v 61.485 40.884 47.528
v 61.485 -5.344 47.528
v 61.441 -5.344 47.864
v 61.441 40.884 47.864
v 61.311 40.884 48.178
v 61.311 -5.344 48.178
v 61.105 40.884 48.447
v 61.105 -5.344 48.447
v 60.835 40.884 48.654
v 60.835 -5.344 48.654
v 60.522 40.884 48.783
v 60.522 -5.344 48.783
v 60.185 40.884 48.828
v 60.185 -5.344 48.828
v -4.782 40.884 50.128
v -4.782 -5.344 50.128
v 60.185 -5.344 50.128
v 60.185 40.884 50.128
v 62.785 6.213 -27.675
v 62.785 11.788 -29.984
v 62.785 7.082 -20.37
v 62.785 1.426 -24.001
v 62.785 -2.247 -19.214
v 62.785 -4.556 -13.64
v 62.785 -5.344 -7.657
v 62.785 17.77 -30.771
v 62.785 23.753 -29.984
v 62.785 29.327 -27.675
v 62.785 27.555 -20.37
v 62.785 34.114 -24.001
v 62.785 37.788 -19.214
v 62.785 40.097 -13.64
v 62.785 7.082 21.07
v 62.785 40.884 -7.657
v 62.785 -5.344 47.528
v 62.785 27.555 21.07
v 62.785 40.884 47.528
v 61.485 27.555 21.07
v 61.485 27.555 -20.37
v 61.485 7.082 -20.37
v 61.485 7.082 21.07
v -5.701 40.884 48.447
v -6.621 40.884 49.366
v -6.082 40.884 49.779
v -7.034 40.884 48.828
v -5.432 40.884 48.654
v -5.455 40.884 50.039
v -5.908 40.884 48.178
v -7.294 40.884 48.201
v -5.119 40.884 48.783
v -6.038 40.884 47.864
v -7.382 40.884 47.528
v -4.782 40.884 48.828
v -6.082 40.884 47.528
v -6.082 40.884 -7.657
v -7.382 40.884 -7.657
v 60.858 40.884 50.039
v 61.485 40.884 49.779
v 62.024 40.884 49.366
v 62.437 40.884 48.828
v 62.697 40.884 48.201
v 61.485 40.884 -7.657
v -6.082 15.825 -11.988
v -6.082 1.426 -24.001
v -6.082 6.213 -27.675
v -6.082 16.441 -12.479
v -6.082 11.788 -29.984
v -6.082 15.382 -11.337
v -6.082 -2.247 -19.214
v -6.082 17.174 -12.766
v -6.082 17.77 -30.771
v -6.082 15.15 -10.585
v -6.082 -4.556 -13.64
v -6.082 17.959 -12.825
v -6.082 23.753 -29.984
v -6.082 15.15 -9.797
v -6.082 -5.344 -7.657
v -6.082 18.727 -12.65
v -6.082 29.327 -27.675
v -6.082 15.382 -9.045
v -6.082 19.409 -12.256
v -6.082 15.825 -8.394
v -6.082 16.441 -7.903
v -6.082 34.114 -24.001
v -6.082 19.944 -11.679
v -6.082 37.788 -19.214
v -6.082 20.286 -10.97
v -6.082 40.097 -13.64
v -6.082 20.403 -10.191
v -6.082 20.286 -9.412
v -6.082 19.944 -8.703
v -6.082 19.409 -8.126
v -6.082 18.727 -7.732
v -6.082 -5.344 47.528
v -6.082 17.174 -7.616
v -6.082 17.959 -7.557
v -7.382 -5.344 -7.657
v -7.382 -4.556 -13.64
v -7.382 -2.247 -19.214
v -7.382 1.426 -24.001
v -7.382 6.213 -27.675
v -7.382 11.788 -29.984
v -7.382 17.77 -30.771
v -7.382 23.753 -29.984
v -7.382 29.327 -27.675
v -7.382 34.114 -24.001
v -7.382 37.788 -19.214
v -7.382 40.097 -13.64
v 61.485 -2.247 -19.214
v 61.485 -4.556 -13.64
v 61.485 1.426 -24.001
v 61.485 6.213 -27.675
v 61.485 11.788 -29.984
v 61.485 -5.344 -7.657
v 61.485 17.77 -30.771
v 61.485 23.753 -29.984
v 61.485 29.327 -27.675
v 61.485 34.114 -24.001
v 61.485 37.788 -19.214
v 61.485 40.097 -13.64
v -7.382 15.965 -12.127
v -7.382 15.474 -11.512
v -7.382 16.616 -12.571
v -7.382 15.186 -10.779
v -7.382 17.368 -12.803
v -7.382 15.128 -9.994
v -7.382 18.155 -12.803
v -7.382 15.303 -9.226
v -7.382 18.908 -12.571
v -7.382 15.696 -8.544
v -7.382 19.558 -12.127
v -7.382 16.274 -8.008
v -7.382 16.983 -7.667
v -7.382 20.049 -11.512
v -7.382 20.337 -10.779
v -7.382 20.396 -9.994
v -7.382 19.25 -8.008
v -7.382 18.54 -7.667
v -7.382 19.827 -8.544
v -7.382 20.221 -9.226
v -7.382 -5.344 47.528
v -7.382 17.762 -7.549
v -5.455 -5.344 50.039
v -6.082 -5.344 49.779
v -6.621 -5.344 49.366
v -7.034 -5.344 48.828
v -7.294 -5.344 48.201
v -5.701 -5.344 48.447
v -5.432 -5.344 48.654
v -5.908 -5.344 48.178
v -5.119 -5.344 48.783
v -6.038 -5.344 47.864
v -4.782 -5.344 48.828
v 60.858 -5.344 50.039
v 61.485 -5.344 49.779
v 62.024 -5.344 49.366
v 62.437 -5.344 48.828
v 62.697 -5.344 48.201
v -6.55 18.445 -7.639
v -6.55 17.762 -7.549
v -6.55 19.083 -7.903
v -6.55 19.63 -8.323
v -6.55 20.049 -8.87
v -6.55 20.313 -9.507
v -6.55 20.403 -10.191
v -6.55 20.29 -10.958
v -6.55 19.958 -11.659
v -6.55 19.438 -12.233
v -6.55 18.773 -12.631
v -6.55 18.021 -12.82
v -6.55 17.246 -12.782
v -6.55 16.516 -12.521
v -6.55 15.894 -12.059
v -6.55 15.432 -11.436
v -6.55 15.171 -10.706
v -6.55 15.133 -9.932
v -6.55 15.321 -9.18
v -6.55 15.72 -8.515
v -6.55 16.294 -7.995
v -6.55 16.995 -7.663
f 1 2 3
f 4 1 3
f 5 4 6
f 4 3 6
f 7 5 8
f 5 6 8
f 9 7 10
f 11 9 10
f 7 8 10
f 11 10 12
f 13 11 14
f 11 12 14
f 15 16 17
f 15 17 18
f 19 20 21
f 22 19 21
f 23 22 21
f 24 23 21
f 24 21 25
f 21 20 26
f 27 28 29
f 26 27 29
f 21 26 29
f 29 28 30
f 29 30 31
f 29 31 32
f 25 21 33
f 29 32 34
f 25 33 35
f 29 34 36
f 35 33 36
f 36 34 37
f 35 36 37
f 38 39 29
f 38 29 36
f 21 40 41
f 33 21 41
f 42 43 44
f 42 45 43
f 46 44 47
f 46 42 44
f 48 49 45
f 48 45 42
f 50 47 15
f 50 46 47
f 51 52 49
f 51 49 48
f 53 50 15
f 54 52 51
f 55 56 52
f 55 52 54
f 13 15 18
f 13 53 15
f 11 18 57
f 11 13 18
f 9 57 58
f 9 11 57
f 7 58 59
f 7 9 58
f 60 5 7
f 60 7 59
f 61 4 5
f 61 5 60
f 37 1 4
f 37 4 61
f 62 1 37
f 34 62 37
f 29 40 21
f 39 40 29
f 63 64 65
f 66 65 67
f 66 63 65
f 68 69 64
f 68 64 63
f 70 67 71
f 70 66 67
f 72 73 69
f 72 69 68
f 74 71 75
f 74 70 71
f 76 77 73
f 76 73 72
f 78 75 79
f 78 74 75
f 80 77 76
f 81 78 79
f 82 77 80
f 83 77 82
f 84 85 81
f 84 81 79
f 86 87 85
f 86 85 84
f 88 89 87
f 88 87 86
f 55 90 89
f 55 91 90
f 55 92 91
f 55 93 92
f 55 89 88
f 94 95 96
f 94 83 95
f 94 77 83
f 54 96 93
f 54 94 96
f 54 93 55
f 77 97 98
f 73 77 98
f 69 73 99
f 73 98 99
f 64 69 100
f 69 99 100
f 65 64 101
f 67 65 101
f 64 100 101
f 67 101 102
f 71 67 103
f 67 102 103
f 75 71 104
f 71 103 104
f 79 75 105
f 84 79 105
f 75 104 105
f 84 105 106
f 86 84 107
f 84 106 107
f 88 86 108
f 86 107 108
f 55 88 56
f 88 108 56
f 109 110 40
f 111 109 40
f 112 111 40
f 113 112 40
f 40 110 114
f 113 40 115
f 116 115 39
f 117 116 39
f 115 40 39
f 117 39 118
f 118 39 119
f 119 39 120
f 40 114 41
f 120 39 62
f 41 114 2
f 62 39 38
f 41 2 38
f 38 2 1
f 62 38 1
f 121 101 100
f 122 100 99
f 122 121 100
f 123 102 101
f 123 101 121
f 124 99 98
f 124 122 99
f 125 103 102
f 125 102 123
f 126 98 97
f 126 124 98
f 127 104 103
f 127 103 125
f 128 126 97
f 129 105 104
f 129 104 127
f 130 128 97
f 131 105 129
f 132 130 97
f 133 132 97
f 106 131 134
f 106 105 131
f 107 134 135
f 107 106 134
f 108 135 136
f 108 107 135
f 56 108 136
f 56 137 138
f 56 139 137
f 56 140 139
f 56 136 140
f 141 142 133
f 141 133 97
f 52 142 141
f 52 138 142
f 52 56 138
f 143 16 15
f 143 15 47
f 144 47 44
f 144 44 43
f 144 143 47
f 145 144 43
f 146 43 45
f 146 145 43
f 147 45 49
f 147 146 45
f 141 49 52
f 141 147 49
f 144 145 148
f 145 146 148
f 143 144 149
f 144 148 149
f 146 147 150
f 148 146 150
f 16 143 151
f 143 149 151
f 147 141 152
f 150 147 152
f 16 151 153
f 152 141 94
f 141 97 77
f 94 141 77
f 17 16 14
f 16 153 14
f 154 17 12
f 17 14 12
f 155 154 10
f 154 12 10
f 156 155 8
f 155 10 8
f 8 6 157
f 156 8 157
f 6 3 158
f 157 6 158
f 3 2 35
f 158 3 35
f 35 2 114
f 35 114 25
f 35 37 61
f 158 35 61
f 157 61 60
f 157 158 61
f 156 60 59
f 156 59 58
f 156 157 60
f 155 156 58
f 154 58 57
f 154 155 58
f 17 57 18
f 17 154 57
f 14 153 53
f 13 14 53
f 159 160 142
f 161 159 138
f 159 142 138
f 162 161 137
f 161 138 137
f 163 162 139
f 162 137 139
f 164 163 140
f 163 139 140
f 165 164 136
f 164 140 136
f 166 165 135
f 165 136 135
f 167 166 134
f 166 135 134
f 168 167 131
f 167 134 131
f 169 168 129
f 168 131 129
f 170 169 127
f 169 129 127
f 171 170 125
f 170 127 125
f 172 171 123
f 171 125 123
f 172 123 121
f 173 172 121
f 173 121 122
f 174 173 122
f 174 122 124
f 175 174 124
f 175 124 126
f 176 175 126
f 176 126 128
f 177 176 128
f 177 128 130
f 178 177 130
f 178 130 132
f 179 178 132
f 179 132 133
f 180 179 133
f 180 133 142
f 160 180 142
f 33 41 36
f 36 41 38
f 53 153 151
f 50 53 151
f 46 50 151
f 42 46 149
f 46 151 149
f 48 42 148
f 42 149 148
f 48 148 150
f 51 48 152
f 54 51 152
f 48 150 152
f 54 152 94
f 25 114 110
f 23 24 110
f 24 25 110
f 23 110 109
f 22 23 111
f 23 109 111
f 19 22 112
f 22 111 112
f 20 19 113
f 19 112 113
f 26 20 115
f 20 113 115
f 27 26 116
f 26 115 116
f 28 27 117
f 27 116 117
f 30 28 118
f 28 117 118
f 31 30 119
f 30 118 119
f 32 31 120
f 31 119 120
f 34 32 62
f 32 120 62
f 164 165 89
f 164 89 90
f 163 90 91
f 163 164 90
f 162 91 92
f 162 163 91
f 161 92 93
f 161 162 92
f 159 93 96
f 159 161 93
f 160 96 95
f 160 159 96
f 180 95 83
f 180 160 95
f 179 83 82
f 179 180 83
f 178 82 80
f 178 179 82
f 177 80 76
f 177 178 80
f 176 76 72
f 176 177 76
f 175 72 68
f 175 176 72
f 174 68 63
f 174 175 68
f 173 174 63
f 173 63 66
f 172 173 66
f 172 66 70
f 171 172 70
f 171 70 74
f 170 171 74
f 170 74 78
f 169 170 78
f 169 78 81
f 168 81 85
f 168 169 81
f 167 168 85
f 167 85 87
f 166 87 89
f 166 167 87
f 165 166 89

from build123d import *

# Parameters (mm, degrees)
BOSS_EXTRUDE1_DEPTH        = 53.974999999999994
CUT_EXTRUDE1_DEPTH         = 53.974999999999994
CUT_EXTRUDE2_DEPTH         = 40.64
SKETCH4_R                  = 2.0319999999999996
CUT_EXTRUDE3_DEPTH         = 12.699999999999996
CONVERT_SOLID1_DEPTH       = 35.56
CONVERT_SOLID1_START       = 0.640171996
CONVERT_SOLID1_2_OUTLINE_R = 2.032
CONVERT_SOLID1_2_DEPTH     = 0.359828036
CONVERT_SOLID1_START_2     = 52.974999968
CONVERT_SOLID1_3_OUTLINE_W = 15.748000000000001
CONVERT_SOLID1_3_OUTLINE_H = 31.877
CONVERT_SOLID1_3_DEPTH     = 0.241146378
CONVERT_SOLID1_START_3     = 1.000000032
CONVERT_SOLID1_4_OUTLINE_W = 35.56
CONVERT_SOLID1_4_OUTLINE_H = 0.1377071679999986
CONVERT_SOLID1_4_DEPTH     = 51.974999936
CONVERT_SOLID1_5_DEPTH     = 35.56
SCALE1_SCALE               = 1.3


with BuildPart() as part:
    # Sketch1 → Boss-Extrude1 (new body)
    with BuildSketch(Plane(origin=(0, 0, 0), x_dir=(0, 0, -1), z_dir=(1, 0, 0))):
        with BuildLine():
            Line((0, 0), (-44.449999999999996, -5.44e-15))
            Line((-44.449999999999996, -5.44e-15), (-44.449999999999996, 35.55999999999999))
            Line((-44.449999999999996, 35.55999999999999), (0, 35.55999999999999))
            ThreePointArc((0, 35.55999999999999), (17.779999999999994, 17.779999999999994), (0, 0))
        make_face()
    extrude(amount=BOSS_EXTRUDE1_DEPTH)

    # Sketch2 → Cut-Extrude1 (cut)
    with BuildSketch(Plane(origin=(0, 35.55999999999999, 0), x_dir=(1, 0, 0), z_dir=(0, 1, 0))):
        Polygon((0.6401719962352073, 17.998125077829755), (0.6401719962352074, -43.58770713635029), (53.21614634609016, -43.58770713635029), (53.21614634609016, 17.998125077829755), align=None)
    extrude(amount=-CUT_EXTRUDE1_DEPTH, mode=Mode.SUBTRACT)

    # Sketch3 → Cut-Extrude2 (cut)
    with BuildSketch(Plane(origin=(53.974999999999994, 0, 0), x_dir=(0, 0, -1), z_dir=(1, 0, 0))):
        Polygon((-22.098, 25.306389569999986), (9.779, 25.306389569999986), (9.778999999999996, 9.558389569999989), (-22.098, 9.558389569999983), align=None)
    extrude(amount=-CUT_EXTRUDE2_DEPTH, mode=Mode.SUBTRACT)

    # Sketch4 → Cut-Extrude3 (cut)
    with BuildSketch(Plane.ZY):
        with Locations((-1.948939271970541, 17.773350266981094)):
            Circle(SKETCH4_R)
    extrude(amount=-CUT_EXTRUDE3_DEPTH, mode=Mode.SUBTRACT)

    # Convert-Solid1: read off the stored shape, not the designer's step
    # Convert-Solid1 outline → Convert-Solid1 (cut)
    with BuildSketch(Plane(origin=(0, 0, 0), x_dir=(1, 0, 0), z_dir=(0, 1, 0))):
        with BuildLine():
            Line((0, -44.45), (2.000000064, -44.45))
            ThreePointArc((2.000000064, -44.45), (0.585786456, -43.864213544), (0, -42.449999936))
            Line((0, -42.449999936), (0, -44.45))
        make_face()
        with BuildLine():
            Line((53.975, -44.45), (53.975, -42.449999936))
            ThreePointArc((53.975, -42.449999936), (53.389213544, -43.864213544), (51.974999936, -44.45))
            Line((51.974999936, -44.45), (53.975, -44.45))
        make_face()
    extrude(amount=CONVERT_SOLID1_DEPTH, mode=Mode.SUBTRACT)

    # Convert-Solid1 2 outline → Convert-Solid1 2 (add)
    with BuildSketch(Plane.YZ.offset(CONVERT_SOLID1_START)):
        with BuildLine():
            Line((35.56, 43.587707136), (0, 43.587707136))
            Line((0, 43.587707136), (0, 0))
            ThreePointArc((0, 0), (17.78, -17.78), (35.56, 0))
            Line((35.56, 0), (35.56, 43.587707136))
        make_face()
        with Locations((17.773350267, -1.948939272)):
            Circle(CONVERT_SOLID1_2_OUTLINE_R, mode=Mode.SUBTRACT)
    extrude(amount=CONVERT_SOLID1_2_DEPTH)

    # Convert-Solid1 3 outline → Convert-Solid1 3 (add)
    with BuildSketch(Plane.YZ.offset(CONVERT_SOLID1_START_2)):
        with BuildLine():
            Line((35.56, 43.587707136), (0, 43.587707136))
            Line((0, 43.587707136), (0, 0))
            ThreePointArc((0, 0), (17.78, -17.78), (35.56, 0))
            Line((35.56, 0), (35.56, 43.587707136))
        make_face()
        with Locations((17.432389569999998, 6.1594999999999995)):
            Rectangle(CONVERT_SOLID1_3_OUTLINE_W, CONVERT_SOLID1_3_OUTLINE_H, mode=Mode.SUBTRACT)
    extrude(amount=CONVERT_SOLID1_3_DEPTH)

    # Convert-Solid1 4 outline → Convert-Solid1 4 (add)
    with BuildSketch(Plane.YZ.offset(CONVERT_SOLID1_START_3)):
        with Locations((17.78, 43.518853551999996)):
            Rectangle(CONVERT_SOLID1_4_OUTLINE_W, CONVERT_SOLID1_4_OUTLINE_H)
    extrude(amount=CONVERT_SOLID1_4_DEPTH)

    # Convert-Solid1 5 outline → Convert-Solid1 5 (add)
    with BuildSketch(Plane(origin=(0, 0, 0), x_dir=(1, 0, 0), z_dir=(0, 1, 0))):
        with BuildLine():
            Line((1.000000032, -43.449999968), (2.000000064, -43.449999968))
            ThreePointArc((2.000000064, -43.449999968), (1.29289326, -43.15710674), (1.000000032, -42.449999936))
            Line((1.000000032, -42.449999936), (1.000000032, -43.449999968))
        make_face()
        with BuildLine():
            ThreePointArc((52.974999968, -42.449999936), (52.68210674, -43.15710674), (51.974999936, -43.449999968))
            Line((51.974999936, -43.449999968), (52.974999968, -43.449999968))
            Line((52.974999968, -43.449999968), (52.974999968, -42.449999936))
        make_face()
    extrude(amount=CONVERT_SOLID1_5_DEPTH)


with BuildPart() as part_1:
    # Scale1: scaled about (24.607246438, 17.812081852, 25.524433927)
    add(part.part.scale(SCALE1_SCALE).moved(Location((-7.382173931400001, -5.3436245556, -7.657330178100001))))


solid = part_1.part
